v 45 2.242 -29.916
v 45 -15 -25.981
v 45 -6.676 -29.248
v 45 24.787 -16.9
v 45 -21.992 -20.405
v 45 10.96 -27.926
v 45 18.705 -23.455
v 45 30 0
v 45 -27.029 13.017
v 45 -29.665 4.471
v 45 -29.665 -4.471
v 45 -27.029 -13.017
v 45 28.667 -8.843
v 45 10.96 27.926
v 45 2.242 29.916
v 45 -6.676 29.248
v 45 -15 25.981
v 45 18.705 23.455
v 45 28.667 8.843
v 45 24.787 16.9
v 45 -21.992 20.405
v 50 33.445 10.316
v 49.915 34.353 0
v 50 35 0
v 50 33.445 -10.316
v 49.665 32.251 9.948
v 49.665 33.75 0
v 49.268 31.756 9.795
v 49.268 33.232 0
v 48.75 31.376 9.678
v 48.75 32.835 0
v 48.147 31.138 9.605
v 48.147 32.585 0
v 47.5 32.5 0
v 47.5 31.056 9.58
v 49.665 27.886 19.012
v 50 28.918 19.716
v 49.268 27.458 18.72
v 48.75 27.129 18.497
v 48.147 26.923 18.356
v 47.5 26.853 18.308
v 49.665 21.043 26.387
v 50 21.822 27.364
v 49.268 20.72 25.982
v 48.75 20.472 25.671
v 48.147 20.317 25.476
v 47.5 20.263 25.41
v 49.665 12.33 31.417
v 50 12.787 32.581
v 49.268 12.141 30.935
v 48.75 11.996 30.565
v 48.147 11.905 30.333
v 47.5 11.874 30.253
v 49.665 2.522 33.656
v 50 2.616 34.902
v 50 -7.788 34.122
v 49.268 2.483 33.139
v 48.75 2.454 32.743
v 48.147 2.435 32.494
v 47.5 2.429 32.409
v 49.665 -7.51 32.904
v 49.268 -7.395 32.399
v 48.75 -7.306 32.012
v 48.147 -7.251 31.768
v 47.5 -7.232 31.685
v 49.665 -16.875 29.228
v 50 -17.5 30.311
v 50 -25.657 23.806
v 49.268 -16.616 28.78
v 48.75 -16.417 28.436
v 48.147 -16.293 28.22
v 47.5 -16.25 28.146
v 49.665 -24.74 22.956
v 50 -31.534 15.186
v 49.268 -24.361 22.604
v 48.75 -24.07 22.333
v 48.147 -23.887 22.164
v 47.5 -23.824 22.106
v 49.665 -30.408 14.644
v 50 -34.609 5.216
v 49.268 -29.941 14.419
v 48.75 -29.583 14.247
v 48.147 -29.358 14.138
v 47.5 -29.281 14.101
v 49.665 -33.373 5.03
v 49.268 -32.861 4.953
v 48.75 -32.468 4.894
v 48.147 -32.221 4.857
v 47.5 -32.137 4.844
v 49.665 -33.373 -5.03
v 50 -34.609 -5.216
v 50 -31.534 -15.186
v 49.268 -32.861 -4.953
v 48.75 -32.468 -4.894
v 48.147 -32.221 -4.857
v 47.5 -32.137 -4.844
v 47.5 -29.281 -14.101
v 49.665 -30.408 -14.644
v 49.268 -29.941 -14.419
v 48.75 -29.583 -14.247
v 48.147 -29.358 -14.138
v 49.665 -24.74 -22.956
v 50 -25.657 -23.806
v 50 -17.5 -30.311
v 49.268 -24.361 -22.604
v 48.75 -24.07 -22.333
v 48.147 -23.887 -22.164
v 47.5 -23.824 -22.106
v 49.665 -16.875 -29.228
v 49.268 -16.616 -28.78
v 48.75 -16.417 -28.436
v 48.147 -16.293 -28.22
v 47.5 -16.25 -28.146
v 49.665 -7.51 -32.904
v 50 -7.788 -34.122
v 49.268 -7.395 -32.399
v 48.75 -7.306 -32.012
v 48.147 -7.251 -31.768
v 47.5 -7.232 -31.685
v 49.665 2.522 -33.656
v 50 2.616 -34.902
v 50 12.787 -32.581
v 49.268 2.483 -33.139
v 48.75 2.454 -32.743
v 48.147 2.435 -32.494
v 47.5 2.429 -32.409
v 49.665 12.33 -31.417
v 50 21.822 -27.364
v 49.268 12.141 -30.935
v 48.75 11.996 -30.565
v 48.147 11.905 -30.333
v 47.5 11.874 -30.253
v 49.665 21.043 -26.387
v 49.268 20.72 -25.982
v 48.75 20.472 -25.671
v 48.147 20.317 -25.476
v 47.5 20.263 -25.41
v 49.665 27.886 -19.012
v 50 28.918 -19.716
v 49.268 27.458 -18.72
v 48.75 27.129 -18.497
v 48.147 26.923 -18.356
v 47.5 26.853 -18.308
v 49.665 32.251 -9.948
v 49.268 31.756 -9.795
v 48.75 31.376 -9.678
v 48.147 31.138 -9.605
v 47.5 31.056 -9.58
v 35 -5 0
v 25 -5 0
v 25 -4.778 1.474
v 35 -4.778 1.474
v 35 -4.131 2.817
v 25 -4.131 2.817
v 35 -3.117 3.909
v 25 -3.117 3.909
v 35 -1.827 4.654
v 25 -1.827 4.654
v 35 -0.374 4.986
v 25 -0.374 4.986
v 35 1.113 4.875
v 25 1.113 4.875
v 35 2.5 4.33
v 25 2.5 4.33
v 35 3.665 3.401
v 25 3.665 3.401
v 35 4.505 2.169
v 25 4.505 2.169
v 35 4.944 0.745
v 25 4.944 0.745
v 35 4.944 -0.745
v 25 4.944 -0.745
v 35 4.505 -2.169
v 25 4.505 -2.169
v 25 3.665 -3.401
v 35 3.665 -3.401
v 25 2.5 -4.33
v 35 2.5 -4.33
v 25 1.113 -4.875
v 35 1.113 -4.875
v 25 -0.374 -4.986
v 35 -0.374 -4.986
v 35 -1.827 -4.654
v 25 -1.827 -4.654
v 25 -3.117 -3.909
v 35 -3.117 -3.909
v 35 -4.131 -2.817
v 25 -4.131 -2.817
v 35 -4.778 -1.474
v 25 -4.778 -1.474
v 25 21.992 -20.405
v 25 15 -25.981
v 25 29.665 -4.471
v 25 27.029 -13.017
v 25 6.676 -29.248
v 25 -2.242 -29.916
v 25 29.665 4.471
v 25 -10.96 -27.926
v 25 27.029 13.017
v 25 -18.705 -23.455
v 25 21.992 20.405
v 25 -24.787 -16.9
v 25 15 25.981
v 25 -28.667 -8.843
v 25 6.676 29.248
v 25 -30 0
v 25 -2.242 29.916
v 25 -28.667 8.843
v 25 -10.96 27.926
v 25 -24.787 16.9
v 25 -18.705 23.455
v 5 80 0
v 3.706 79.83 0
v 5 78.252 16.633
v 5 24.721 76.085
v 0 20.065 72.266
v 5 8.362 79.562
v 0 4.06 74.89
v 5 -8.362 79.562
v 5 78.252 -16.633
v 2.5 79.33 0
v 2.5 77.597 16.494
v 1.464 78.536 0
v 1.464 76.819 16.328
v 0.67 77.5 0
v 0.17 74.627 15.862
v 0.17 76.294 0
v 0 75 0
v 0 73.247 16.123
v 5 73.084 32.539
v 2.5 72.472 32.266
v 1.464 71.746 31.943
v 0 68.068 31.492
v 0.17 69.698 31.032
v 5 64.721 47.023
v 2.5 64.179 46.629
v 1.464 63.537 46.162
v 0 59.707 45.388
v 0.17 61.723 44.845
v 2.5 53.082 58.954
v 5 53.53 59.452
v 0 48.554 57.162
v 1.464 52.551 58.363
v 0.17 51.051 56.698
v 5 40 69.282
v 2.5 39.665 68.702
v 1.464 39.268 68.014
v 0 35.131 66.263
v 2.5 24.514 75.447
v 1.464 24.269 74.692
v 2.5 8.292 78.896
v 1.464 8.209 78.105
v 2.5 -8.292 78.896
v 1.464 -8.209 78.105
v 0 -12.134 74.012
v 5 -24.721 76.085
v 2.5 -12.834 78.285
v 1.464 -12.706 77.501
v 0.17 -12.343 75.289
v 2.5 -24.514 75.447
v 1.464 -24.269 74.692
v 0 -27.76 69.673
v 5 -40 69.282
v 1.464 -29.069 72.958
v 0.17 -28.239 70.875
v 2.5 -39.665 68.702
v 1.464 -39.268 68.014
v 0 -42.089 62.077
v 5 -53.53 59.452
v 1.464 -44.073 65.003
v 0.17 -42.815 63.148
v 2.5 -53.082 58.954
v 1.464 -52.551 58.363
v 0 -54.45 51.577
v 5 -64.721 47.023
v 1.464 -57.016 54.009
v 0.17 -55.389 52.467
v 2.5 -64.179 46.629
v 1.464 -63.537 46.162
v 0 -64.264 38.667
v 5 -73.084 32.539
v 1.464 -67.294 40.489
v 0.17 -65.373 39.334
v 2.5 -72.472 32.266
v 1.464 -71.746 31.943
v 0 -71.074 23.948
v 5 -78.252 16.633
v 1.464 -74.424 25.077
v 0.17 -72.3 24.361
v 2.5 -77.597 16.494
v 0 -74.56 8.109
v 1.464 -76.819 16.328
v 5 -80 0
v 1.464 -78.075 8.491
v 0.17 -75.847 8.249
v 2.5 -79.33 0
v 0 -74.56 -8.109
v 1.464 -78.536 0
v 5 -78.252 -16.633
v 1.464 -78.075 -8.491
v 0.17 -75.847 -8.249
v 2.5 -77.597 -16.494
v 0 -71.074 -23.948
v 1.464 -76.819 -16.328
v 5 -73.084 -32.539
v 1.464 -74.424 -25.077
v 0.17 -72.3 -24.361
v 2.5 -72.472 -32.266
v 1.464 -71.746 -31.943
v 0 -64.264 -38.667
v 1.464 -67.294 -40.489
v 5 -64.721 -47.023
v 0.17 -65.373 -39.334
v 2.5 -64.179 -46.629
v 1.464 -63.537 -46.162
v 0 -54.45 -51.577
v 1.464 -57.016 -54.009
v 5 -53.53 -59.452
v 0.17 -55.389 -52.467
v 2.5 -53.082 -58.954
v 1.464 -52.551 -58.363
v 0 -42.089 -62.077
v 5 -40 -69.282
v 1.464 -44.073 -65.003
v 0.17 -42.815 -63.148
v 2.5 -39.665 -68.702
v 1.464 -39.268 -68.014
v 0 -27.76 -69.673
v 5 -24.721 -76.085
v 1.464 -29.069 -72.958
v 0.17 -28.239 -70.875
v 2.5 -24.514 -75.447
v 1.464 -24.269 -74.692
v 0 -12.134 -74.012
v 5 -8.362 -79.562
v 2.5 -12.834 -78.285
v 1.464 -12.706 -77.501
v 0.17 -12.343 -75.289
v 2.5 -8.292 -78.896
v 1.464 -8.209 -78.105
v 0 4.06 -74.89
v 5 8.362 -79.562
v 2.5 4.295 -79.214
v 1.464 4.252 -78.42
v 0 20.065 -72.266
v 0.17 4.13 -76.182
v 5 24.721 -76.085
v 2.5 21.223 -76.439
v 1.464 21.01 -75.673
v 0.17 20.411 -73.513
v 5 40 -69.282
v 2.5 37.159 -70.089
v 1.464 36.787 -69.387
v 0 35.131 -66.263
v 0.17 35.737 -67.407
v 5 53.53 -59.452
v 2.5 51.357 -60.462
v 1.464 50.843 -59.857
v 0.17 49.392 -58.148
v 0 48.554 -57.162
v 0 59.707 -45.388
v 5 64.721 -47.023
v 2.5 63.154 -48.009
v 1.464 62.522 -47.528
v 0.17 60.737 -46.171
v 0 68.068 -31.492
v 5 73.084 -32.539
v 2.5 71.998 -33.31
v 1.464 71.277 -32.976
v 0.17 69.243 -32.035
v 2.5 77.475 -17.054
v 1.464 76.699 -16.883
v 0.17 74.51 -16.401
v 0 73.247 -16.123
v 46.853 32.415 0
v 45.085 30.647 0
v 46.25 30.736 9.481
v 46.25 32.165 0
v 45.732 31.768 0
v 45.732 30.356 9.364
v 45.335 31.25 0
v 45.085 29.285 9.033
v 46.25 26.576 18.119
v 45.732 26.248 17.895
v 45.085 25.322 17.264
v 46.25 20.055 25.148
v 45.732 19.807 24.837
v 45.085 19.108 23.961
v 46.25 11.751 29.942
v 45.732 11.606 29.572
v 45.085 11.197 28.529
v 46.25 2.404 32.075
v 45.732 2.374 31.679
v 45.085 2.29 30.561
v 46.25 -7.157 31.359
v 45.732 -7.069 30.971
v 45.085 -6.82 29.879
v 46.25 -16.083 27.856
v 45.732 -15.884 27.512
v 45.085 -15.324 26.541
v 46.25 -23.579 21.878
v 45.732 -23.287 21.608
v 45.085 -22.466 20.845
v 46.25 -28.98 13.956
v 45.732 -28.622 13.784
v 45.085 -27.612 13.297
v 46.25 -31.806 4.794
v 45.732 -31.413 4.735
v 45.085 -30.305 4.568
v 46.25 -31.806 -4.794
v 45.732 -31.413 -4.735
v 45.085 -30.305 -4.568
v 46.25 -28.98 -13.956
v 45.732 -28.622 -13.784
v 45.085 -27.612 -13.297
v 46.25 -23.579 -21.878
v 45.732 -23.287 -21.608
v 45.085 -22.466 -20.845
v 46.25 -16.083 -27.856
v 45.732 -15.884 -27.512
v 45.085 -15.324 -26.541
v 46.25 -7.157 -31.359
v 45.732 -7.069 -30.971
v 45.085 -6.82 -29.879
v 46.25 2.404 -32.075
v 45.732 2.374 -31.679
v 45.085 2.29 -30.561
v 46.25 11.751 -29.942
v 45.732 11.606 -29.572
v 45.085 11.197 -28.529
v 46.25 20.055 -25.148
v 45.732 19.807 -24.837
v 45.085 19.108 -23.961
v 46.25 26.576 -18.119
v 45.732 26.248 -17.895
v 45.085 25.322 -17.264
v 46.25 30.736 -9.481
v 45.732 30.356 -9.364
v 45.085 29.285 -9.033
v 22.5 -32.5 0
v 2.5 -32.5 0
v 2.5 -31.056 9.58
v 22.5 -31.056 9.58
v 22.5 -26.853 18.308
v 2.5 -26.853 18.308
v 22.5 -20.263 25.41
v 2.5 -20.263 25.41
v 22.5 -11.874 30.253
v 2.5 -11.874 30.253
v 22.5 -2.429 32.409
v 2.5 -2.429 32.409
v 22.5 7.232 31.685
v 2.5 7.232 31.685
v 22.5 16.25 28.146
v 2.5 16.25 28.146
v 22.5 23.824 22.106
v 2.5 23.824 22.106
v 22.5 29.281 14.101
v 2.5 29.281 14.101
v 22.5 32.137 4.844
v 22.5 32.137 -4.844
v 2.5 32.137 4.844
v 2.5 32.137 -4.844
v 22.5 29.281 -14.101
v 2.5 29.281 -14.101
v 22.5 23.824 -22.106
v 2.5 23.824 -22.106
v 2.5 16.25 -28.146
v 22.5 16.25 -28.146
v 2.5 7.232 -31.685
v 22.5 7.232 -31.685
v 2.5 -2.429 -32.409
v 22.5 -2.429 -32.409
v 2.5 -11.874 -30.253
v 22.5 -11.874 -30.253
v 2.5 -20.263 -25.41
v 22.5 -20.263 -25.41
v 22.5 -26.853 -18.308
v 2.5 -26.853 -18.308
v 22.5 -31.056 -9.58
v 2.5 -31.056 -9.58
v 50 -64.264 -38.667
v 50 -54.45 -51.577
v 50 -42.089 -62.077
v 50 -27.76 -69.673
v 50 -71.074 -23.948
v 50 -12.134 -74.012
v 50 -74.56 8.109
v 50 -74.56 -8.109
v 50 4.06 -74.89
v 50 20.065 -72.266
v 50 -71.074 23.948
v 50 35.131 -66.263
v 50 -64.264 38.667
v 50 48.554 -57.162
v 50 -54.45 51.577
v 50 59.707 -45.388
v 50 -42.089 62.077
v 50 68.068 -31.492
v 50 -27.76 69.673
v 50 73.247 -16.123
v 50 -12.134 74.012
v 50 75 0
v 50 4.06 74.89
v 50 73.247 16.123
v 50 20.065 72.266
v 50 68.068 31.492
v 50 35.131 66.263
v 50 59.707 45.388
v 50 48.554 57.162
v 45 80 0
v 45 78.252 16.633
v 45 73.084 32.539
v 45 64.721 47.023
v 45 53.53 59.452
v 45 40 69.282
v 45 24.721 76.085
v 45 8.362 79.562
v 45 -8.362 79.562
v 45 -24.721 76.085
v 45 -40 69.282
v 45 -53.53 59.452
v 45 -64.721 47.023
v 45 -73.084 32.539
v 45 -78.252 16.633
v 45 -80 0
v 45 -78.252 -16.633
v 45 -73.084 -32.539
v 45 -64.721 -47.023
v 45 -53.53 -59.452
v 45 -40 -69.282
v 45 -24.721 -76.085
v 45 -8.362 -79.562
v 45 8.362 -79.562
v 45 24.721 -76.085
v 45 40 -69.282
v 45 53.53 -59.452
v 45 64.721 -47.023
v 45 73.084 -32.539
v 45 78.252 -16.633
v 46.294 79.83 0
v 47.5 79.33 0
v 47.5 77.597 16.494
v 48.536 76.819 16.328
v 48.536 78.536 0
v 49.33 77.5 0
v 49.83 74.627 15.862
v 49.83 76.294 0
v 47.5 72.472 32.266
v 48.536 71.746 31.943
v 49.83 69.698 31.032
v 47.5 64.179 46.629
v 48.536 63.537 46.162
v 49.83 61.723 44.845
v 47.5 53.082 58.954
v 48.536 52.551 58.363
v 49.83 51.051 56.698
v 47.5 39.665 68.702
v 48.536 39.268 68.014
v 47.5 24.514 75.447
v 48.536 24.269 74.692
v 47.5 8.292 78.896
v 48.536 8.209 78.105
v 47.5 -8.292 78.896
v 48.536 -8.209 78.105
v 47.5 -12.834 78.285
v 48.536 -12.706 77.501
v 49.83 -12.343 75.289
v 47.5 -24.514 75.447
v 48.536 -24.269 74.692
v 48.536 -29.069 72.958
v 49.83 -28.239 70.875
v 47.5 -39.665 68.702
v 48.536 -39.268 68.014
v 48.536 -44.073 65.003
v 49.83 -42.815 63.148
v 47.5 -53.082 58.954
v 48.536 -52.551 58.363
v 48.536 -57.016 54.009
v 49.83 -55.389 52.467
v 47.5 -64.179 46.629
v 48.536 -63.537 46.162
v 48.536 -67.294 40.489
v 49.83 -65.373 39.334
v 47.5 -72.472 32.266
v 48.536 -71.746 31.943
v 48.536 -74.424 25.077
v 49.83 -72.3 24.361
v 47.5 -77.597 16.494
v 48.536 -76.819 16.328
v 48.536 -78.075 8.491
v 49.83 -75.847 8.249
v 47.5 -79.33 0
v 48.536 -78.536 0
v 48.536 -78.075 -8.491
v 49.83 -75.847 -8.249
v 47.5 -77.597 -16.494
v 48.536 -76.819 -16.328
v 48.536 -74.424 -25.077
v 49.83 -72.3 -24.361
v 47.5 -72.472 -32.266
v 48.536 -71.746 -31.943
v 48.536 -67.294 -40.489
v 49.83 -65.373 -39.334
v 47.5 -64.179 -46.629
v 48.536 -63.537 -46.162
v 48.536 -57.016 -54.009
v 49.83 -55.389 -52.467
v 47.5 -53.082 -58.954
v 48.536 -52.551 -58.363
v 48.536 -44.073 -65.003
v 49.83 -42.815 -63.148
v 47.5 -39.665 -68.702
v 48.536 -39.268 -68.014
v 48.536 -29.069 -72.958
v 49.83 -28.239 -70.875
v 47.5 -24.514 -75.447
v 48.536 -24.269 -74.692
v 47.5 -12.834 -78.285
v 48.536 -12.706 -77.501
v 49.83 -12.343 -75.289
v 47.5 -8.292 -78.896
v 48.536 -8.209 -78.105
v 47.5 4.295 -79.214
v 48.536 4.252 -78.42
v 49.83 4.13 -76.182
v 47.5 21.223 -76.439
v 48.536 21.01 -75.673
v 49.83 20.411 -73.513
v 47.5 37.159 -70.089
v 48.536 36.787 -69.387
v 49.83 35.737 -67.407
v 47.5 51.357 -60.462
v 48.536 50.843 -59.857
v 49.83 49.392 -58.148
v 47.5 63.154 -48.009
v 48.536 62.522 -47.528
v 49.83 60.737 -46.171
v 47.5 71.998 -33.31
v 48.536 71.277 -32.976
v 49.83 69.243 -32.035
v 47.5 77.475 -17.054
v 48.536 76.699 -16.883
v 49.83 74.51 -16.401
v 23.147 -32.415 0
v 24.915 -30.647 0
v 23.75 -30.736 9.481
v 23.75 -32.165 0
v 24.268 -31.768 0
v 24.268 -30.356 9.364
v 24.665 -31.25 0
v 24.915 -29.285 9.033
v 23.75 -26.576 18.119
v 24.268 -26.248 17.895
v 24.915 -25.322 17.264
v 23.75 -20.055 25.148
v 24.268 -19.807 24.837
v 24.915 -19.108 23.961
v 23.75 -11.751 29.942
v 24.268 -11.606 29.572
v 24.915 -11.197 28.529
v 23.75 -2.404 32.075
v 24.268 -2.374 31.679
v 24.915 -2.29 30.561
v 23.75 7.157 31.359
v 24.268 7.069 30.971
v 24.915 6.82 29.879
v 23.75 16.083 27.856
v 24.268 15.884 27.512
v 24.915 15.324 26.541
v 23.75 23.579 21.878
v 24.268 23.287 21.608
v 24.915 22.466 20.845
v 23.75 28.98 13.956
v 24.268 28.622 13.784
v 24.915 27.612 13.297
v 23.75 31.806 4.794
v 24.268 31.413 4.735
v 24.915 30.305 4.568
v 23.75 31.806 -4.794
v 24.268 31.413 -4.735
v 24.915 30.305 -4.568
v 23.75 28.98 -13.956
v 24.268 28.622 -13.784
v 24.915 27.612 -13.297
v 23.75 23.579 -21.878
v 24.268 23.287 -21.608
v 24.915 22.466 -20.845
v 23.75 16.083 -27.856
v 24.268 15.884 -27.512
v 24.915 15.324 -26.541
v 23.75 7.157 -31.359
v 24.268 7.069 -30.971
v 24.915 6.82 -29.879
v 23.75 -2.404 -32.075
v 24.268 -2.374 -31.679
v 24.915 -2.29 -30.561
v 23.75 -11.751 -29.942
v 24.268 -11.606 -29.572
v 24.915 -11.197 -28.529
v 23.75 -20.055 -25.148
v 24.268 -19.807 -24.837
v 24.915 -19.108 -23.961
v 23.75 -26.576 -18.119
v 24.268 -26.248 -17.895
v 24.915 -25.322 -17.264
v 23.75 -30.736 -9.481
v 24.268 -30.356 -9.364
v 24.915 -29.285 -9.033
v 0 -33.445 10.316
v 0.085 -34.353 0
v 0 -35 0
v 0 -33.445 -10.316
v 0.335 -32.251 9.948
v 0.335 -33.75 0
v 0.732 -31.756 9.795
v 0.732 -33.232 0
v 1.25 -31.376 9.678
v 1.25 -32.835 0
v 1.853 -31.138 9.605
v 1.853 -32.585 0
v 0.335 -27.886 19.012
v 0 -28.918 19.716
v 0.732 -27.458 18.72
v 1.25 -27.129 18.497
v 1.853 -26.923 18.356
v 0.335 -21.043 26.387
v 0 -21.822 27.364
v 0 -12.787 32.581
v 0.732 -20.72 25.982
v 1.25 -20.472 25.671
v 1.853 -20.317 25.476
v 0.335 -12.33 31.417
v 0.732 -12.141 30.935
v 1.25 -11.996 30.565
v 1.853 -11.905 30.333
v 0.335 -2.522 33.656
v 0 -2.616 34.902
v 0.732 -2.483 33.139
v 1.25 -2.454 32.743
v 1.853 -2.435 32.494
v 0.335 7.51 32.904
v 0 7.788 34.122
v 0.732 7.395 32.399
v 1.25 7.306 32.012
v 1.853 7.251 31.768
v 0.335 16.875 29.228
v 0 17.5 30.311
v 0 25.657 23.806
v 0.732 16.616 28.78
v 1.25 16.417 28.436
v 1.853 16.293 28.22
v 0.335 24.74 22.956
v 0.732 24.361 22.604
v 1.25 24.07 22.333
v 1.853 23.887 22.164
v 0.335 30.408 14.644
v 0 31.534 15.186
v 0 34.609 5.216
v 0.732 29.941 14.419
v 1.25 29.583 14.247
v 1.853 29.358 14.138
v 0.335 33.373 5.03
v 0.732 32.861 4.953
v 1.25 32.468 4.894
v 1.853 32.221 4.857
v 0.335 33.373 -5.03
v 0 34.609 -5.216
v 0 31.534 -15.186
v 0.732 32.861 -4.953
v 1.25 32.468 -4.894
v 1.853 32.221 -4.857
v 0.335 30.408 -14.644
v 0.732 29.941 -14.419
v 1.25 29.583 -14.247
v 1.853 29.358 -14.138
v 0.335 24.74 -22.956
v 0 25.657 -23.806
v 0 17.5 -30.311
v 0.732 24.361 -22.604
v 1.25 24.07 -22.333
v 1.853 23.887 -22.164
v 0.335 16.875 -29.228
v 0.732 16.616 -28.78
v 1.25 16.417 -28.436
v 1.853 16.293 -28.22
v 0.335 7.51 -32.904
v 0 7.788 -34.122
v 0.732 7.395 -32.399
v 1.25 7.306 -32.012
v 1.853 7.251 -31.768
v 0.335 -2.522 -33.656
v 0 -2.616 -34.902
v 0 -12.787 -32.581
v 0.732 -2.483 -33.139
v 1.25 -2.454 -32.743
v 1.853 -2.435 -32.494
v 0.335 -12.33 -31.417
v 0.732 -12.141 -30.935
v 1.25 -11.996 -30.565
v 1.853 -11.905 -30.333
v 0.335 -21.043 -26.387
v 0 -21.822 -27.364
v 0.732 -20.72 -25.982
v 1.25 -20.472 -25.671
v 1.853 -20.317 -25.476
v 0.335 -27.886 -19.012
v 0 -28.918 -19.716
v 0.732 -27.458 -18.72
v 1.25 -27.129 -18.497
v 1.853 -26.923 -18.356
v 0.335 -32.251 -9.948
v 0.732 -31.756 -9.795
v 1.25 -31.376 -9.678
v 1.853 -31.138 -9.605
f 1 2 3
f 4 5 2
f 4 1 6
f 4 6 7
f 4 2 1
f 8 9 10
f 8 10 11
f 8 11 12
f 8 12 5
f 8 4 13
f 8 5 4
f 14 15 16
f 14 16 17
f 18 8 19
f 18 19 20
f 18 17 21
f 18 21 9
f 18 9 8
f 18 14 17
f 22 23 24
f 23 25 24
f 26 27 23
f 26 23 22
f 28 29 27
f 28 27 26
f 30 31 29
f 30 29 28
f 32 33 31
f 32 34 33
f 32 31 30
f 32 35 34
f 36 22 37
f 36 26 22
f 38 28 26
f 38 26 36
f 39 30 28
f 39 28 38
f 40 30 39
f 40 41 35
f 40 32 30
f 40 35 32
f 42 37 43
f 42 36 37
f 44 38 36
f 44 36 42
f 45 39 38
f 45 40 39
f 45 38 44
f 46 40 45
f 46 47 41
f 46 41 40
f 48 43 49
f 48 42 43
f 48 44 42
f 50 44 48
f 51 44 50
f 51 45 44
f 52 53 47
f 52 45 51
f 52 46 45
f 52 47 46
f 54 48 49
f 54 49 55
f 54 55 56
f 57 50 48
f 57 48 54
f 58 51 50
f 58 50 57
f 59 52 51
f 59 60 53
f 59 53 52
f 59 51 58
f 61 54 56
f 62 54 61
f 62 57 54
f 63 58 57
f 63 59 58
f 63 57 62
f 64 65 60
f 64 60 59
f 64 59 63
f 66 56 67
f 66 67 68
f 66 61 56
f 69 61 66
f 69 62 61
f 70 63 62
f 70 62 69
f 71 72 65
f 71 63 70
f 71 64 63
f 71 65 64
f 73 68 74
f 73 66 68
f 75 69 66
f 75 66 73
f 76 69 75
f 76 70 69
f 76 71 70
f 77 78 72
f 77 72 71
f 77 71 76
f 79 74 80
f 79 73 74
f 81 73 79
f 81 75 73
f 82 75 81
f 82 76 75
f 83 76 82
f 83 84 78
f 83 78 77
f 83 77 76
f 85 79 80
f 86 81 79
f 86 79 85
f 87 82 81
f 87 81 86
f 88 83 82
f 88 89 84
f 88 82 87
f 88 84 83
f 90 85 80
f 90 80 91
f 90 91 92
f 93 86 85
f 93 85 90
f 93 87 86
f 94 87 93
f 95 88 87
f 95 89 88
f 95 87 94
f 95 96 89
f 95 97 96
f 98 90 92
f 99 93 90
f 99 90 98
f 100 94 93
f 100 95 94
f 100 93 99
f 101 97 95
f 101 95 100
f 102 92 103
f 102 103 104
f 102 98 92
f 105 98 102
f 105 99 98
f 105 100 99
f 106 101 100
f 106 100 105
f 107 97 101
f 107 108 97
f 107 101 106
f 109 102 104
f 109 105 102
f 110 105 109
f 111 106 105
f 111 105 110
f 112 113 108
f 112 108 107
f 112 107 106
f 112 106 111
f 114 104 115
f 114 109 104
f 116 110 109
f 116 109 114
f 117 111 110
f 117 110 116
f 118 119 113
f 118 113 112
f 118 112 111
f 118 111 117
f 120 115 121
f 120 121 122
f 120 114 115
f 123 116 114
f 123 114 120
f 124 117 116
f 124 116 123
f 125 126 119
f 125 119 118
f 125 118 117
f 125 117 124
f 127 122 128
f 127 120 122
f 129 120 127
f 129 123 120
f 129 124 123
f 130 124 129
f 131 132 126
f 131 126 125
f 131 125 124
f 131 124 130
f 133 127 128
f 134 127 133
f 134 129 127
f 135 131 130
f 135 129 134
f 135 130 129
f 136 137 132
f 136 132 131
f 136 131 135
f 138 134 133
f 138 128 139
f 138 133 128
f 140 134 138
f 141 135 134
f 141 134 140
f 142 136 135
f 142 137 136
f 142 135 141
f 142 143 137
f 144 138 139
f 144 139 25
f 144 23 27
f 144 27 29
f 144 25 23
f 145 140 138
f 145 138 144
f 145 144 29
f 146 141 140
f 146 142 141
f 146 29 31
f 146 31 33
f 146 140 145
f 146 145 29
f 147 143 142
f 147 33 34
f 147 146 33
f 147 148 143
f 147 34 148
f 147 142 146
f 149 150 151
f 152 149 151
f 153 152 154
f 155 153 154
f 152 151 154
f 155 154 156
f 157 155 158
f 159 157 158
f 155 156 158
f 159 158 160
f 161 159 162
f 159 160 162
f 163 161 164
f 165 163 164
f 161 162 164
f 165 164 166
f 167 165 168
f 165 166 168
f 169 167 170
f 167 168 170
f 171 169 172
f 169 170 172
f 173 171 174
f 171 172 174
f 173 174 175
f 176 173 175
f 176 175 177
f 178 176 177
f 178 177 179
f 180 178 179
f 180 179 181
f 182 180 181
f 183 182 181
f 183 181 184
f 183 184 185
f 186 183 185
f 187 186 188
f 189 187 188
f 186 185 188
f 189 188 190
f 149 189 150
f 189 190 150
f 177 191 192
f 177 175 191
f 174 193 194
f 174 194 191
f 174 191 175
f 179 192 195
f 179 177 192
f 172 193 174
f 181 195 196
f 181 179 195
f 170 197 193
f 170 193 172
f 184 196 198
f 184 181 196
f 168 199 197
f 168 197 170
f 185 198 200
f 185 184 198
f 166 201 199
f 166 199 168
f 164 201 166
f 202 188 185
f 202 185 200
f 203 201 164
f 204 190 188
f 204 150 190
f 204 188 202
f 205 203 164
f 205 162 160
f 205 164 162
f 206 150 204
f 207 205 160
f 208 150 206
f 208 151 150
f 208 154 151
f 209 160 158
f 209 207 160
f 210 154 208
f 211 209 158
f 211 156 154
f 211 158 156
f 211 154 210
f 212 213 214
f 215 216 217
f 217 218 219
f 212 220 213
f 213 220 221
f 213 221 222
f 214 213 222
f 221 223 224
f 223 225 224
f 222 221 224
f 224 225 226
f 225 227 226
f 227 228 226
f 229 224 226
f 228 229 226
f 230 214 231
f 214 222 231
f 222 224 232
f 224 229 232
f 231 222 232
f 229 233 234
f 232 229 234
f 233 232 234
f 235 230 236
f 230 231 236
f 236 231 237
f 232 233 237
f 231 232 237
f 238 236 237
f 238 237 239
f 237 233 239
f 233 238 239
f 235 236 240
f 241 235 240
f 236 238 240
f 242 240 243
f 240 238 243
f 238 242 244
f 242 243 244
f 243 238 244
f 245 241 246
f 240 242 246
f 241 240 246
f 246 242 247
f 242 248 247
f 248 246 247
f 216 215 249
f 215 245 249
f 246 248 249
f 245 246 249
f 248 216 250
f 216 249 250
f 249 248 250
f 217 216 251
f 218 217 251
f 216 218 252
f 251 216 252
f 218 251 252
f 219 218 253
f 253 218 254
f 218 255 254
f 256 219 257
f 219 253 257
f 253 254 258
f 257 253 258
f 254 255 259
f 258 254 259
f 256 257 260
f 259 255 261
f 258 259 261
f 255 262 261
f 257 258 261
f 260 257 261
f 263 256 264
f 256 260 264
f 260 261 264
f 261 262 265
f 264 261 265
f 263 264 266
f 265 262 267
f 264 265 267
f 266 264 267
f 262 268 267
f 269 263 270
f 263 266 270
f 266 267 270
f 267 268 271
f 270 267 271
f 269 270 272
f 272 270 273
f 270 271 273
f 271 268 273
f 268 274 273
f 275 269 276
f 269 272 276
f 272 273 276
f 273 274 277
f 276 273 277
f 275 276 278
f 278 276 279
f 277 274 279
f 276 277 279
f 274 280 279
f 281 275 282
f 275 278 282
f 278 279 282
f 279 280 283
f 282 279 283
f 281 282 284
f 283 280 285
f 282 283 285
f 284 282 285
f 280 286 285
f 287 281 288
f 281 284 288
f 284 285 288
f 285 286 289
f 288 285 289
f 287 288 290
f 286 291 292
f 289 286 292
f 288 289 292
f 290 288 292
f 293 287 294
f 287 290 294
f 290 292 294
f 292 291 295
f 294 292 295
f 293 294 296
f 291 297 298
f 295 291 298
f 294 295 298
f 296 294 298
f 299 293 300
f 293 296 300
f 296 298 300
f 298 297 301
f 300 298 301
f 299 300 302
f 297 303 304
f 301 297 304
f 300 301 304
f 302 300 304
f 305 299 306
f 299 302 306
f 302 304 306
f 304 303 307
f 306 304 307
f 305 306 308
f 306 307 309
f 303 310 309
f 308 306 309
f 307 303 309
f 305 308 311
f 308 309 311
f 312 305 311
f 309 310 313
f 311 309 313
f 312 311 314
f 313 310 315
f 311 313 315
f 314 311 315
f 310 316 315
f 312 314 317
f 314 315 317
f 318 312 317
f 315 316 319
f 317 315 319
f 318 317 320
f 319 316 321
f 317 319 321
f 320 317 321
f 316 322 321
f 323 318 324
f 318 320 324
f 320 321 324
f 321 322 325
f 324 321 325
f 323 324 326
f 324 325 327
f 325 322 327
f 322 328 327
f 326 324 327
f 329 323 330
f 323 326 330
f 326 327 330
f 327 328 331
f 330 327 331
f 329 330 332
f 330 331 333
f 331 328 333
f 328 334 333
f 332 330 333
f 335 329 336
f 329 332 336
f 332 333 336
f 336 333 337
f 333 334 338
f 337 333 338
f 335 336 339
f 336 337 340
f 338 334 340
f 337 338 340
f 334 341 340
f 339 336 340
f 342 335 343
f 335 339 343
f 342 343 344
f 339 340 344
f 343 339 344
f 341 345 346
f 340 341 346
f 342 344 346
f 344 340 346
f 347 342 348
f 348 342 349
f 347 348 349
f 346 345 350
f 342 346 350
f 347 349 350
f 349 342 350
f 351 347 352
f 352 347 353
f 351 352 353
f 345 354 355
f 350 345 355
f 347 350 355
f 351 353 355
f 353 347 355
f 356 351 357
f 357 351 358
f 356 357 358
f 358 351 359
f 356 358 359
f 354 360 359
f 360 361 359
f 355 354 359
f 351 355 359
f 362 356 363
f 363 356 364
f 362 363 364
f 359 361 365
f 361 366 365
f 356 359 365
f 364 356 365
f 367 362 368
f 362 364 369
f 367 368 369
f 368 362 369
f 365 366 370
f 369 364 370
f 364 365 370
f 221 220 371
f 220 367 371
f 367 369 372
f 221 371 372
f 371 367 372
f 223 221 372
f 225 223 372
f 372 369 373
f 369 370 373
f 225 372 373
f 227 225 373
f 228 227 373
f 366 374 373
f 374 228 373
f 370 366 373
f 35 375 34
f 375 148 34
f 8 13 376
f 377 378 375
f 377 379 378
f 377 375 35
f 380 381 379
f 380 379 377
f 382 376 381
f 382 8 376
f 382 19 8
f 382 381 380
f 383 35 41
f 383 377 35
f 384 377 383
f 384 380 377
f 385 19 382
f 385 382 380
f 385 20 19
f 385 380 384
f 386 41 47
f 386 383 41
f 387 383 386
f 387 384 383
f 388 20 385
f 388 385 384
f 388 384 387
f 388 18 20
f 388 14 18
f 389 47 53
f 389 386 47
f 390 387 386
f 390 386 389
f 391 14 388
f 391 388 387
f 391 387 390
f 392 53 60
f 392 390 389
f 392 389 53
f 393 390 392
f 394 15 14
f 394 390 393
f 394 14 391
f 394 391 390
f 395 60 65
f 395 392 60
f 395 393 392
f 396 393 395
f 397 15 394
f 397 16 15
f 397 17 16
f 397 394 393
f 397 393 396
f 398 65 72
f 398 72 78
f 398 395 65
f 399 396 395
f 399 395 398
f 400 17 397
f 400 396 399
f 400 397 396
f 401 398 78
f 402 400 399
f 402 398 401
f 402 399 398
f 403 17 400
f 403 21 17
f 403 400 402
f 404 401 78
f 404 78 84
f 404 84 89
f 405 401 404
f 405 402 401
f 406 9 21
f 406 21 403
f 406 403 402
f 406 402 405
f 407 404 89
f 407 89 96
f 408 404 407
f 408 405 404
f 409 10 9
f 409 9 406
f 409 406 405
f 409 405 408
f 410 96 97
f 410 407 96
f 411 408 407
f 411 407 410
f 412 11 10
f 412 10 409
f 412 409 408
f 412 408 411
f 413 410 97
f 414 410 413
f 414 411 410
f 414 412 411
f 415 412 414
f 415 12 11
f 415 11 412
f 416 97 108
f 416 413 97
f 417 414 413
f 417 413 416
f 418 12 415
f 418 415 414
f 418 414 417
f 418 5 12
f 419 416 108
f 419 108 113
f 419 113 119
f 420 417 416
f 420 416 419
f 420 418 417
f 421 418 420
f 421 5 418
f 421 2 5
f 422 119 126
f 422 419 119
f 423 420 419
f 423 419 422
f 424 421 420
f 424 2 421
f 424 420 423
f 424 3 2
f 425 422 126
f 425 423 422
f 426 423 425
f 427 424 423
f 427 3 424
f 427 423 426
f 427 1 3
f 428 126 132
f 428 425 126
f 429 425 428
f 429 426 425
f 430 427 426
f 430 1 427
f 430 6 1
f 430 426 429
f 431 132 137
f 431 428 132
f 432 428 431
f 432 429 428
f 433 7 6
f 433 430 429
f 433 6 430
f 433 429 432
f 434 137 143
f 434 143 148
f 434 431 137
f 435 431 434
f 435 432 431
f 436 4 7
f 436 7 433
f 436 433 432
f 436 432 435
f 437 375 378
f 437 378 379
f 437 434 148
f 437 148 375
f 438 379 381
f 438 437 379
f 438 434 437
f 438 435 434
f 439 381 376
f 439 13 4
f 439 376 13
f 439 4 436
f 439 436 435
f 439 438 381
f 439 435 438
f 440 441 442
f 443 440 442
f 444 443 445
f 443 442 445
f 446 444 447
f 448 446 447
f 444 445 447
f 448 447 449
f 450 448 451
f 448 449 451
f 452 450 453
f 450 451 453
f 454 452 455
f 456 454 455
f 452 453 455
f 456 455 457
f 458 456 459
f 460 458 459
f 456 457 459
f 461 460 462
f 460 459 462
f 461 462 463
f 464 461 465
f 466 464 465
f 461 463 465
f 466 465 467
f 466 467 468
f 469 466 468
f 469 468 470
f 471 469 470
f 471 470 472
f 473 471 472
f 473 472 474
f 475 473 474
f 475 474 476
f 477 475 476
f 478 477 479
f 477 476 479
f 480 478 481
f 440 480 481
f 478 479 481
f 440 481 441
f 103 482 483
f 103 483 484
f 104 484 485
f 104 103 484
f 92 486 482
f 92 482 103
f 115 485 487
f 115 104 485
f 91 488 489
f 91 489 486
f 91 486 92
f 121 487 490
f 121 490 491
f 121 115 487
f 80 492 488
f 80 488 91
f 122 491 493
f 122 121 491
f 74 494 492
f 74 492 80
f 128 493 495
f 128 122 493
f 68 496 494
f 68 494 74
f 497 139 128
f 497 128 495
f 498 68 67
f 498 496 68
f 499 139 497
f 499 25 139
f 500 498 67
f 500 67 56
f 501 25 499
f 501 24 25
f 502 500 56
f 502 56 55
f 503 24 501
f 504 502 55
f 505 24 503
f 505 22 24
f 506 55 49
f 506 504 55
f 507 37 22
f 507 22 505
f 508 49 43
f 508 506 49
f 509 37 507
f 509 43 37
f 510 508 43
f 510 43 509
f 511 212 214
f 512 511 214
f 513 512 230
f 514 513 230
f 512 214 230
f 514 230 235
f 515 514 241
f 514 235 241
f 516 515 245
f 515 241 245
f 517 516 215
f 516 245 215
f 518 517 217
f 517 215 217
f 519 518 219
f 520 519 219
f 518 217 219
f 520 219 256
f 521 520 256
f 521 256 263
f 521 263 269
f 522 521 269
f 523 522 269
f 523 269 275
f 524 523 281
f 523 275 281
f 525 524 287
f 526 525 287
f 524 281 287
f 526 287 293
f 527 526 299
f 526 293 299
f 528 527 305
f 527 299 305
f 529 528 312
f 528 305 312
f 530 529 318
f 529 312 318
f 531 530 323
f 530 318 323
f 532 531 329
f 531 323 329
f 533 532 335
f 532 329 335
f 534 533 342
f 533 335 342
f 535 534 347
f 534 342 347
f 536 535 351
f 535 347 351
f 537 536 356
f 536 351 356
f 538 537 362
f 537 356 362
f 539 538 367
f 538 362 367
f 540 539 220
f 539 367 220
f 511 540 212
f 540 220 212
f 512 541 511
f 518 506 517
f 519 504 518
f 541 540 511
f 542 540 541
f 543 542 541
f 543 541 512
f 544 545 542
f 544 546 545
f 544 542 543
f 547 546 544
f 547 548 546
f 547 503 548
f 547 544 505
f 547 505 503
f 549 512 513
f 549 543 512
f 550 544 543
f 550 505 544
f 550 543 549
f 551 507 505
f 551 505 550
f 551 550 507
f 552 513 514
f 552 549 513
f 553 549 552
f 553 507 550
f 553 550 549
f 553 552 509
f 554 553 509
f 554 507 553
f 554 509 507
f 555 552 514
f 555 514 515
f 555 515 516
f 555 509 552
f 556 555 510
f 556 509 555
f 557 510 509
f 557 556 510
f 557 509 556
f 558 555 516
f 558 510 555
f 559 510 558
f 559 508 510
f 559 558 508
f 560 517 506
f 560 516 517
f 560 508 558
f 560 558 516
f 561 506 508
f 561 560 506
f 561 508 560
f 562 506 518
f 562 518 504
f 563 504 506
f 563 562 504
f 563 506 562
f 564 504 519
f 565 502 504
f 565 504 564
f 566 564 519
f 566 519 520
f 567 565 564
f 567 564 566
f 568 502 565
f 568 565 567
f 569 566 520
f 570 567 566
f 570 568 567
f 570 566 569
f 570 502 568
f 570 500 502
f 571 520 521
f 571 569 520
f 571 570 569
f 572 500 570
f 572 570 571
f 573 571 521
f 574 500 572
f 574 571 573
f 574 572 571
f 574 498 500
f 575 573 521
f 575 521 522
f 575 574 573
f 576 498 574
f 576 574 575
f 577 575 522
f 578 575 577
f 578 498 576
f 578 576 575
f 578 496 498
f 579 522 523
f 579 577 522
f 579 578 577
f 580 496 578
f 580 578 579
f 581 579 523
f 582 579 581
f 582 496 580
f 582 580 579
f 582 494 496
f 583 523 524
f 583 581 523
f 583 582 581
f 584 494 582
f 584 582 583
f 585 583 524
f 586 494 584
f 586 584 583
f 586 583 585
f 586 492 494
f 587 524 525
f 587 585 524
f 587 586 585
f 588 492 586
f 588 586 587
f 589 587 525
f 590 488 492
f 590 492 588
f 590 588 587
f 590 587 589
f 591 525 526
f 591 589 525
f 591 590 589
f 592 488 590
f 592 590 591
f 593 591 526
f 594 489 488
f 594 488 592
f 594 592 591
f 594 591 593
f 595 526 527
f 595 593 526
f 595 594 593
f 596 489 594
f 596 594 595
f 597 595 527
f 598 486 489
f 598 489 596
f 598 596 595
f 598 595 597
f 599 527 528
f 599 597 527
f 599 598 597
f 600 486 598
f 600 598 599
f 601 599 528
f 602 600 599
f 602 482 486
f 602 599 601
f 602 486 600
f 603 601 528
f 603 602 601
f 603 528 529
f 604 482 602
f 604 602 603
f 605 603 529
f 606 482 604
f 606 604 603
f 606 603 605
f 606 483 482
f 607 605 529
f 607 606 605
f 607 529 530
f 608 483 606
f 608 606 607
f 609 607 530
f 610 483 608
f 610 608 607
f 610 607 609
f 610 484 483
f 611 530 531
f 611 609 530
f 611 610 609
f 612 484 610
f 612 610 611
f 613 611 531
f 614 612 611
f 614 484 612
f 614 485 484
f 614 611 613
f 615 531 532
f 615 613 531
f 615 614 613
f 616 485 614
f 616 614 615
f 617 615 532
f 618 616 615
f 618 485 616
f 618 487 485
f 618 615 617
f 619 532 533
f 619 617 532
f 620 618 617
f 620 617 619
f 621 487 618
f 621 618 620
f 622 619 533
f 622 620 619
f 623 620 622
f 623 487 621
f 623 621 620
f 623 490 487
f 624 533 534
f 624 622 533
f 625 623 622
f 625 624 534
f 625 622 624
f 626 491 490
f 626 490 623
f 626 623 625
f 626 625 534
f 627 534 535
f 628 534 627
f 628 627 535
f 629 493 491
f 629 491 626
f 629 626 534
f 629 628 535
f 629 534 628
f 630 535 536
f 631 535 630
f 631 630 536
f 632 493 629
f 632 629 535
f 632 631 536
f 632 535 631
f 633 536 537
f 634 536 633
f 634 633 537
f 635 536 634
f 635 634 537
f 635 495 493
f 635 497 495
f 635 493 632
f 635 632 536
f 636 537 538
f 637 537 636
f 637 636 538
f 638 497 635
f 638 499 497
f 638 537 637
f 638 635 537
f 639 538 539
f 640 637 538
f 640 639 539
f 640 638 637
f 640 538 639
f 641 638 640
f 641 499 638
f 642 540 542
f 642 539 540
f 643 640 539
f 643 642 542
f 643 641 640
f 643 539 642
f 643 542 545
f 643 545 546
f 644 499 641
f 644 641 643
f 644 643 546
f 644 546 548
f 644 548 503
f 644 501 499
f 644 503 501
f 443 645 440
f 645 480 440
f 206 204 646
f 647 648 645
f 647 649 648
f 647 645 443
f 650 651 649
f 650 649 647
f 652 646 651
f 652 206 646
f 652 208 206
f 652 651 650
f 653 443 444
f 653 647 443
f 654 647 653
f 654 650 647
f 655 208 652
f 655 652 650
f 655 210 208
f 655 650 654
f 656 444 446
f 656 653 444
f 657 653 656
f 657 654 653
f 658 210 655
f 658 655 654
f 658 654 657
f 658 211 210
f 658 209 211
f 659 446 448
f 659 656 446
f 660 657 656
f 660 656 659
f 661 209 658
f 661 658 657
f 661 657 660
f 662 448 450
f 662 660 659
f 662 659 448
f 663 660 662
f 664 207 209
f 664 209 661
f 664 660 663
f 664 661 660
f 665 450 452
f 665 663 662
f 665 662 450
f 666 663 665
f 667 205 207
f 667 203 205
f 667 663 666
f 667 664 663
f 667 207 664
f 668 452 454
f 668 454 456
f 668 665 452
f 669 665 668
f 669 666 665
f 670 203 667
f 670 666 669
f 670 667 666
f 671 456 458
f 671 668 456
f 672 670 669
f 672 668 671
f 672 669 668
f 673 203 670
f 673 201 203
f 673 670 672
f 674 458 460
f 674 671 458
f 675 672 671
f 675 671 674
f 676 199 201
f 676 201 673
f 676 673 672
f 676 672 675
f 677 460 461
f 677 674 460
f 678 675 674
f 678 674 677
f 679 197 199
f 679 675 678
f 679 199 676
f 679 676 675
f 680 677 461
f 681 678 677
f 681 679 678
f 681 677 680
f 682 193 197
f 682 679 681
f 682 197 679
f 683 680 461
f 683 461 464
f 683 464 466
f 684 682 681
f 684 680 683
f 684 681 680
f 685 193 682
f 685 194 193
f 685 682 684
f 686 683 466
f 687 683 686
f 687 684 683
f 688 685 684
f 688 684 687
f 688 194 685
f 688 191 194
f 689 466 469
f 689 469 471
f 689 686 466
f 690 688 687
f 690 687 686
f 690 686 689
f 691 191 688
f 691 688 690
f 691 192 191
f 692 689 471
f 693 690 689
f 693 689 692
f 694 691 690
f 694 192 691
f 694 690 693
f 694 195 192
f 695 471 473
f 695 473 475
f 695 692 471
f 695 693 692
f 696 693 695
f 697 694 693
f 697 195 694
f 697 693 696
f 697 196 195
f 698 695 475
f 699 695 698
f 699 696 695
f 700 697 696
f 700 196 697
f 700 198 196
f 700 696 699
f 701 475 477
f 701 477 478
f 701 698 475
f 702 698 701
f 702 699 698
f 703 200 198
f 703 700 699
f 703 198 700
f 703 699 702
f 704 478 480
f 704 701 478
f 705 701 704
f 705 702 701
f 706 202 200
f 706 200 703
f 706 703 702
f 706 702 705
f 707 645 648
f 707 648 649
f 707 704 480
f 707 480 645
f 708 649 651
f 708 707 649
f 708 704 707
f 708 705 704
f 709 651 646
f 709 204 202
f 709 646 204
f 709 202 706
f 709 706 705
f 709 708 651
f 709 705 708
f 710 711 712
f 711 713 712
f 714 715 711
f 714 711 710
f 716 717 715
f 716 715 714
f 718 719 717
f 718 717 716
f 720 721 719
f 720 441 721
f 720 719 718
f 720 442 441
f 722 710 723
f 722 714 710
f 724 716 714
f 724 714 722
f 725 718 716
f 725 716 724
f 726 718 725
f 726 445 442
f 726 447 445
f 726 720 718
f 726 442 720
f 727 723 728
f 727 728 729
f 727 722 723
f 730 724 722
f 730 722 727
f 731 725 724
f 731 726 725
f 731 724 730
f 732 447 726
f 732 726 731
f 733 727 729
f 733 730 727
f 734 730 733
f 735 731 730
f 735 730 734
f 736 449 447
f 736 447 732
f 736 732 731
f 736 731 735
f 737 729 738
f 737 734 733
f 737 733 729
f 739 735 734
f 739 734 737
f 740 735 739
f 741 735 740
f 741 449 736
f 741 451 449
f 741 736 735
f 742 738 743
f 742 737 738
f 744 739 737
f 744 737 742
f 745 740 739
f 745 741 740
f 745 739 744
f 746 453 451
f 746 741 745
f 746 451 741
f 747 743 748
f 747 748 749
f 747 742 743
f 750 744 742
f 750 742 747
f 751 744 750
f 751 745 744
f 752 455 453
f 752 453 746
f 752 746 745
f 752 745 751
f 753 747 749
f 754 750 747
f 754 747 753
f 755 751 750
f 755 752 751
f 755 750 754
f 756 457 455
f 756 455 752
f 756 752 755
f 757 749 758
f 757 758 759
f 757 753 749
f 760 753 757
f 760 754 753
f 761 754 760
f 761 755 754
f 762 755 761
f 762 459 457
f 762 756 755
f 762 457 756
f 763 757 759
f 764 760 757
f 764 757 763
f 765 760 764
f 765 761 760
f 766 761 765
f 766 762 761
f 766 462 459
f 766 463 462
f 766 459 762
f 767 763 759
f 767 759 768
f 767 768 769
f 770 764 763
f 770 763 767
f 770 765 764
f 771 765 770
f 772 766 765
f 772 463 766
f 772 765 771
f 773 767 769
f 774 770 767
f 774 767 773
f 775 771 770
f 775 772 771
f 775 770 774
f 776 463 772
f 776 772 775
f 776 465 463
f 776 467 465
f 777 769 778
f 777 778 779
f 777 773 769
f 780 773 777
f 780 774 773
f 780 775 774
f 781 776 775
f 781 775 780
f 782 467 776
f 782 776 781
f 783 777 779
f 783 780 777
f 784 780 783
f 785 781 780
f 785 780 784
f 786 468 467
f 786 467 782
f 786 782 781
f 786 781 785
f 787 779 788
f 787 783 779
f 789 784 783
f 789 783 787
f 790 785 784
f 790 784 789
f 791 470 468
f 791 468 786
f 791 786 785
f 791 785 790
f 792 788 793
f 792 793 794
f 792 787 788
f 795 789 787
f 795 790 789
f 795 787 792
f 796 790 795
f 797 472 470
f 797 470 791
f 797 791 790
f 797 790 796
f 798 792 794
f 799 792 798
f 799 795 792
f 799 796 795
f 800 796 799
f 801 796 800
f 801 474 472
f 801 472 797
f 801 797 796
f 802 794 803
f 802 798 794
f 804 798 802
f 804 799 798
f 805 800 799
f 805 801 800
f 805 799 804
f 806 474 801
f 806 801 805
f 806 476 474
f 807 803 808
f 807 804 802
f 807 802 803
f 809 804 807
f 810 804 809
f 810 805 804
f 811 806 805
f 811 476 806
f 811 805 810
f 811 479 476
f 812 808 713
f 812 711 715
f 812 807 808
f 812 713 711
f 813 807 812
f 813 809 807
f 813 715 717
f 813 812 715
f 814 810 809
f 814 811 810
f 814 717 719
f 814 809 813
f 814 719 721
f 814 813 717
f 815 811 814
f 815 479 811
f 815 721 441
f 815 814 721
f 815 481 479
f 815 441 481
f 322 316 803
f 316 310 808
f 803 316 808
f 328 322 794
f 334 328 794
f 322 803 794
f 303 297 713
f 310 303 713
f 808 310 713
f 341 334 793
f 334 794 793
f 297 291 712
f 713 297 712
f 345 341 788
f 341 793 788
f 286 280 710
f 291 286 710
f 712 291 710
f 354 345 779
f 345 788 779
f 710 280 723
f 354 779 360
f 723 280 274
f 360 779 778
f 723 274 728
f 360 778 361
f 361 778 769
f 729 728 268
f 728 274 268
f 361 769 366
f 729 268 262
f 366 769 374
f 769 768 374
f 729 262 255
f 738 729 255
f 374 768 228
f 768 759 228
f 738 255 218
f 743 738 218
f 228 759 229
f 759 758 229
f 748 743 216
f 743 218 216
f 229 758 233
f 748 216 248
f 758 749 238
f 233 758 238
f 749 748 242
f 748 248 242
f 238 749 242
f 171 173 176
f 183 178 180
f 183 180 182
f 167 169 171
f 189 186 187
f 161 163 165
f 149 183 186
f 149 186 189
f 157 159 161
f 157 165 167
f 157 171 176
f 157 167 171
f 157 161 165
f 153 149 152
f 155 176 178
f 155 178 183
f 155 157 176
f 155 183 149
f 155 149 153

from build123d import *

# Parameters (mm, degrees)
F0_R     = 80
F1_DEPTH = 50
F2_R     = 32.5
F3_DEPTH = 5
F4_R     = 32.5
F5_DEPTH = 25
F6_R     = 5
F7_DEPTH = 10
F8_R     = 5
F9_R     = 2.49999


# Not quite as in the source:
# - a fillet or chamfer is up to 0.001 mm smaller than in the source, because OpenCascade refuses the exact size


with BuildPart() as f1:
    # F0 (on Right) → F1 (new body)
    with BuildSketch(Plane.YZ):
        Circle(F0_R)
    extrude(amount=F1_DEPTH)

    # F2 (on face) → F3 (cut)
    with BuildSketch(Plane.YZ.offset(50)):
        Circle(F2_R)
    extrude(amount=-F3_DEPTH, mode=Mode.SUBTRACT)

    # F4 (on face) → F5 (cut)
    with BuildSketch(Plane(origin=(0, 0, 0), x_dir=(0, -1, 0), z_dir=(-1, 0, 0))):
        Circle(F4_R)
    extrude(amount=-F5_DEPTH, mode=Mode.SUBTRACT)

    # F6 (on face) → F7 (cut)
    with BuildSketch(Plane(origin=(25, 0, 0), x_dir=(0, -1, 0), z_dir=(-1, 0, 0))):
        Circle(F6_R)
    extrude(amount=-F7_DEPTH, mode=Mode.SUBTRACT)

    # F8
    f8_edges = [f1.edges().sort_by_distance(p)[0] for p in [
        (0, -80, 0),
        (50, -80, 0),
    ]]
    fillet(f8_edges, radius=F8_R)

    # F9 (radius 2.5 in the source; OpenCascade refuses exactly that, so slightly less here)
    f9_edges = [f1.edges().sort_by_distance(p)[0] for p in [
        (50, -32.5, 0),
        (45, -32.5, 0),
        (0, 32.5, 0),
        (25, 32.5, 0),
    ]]
    fillet(f9_edges, radius=F9_R)


solid = f1.part
